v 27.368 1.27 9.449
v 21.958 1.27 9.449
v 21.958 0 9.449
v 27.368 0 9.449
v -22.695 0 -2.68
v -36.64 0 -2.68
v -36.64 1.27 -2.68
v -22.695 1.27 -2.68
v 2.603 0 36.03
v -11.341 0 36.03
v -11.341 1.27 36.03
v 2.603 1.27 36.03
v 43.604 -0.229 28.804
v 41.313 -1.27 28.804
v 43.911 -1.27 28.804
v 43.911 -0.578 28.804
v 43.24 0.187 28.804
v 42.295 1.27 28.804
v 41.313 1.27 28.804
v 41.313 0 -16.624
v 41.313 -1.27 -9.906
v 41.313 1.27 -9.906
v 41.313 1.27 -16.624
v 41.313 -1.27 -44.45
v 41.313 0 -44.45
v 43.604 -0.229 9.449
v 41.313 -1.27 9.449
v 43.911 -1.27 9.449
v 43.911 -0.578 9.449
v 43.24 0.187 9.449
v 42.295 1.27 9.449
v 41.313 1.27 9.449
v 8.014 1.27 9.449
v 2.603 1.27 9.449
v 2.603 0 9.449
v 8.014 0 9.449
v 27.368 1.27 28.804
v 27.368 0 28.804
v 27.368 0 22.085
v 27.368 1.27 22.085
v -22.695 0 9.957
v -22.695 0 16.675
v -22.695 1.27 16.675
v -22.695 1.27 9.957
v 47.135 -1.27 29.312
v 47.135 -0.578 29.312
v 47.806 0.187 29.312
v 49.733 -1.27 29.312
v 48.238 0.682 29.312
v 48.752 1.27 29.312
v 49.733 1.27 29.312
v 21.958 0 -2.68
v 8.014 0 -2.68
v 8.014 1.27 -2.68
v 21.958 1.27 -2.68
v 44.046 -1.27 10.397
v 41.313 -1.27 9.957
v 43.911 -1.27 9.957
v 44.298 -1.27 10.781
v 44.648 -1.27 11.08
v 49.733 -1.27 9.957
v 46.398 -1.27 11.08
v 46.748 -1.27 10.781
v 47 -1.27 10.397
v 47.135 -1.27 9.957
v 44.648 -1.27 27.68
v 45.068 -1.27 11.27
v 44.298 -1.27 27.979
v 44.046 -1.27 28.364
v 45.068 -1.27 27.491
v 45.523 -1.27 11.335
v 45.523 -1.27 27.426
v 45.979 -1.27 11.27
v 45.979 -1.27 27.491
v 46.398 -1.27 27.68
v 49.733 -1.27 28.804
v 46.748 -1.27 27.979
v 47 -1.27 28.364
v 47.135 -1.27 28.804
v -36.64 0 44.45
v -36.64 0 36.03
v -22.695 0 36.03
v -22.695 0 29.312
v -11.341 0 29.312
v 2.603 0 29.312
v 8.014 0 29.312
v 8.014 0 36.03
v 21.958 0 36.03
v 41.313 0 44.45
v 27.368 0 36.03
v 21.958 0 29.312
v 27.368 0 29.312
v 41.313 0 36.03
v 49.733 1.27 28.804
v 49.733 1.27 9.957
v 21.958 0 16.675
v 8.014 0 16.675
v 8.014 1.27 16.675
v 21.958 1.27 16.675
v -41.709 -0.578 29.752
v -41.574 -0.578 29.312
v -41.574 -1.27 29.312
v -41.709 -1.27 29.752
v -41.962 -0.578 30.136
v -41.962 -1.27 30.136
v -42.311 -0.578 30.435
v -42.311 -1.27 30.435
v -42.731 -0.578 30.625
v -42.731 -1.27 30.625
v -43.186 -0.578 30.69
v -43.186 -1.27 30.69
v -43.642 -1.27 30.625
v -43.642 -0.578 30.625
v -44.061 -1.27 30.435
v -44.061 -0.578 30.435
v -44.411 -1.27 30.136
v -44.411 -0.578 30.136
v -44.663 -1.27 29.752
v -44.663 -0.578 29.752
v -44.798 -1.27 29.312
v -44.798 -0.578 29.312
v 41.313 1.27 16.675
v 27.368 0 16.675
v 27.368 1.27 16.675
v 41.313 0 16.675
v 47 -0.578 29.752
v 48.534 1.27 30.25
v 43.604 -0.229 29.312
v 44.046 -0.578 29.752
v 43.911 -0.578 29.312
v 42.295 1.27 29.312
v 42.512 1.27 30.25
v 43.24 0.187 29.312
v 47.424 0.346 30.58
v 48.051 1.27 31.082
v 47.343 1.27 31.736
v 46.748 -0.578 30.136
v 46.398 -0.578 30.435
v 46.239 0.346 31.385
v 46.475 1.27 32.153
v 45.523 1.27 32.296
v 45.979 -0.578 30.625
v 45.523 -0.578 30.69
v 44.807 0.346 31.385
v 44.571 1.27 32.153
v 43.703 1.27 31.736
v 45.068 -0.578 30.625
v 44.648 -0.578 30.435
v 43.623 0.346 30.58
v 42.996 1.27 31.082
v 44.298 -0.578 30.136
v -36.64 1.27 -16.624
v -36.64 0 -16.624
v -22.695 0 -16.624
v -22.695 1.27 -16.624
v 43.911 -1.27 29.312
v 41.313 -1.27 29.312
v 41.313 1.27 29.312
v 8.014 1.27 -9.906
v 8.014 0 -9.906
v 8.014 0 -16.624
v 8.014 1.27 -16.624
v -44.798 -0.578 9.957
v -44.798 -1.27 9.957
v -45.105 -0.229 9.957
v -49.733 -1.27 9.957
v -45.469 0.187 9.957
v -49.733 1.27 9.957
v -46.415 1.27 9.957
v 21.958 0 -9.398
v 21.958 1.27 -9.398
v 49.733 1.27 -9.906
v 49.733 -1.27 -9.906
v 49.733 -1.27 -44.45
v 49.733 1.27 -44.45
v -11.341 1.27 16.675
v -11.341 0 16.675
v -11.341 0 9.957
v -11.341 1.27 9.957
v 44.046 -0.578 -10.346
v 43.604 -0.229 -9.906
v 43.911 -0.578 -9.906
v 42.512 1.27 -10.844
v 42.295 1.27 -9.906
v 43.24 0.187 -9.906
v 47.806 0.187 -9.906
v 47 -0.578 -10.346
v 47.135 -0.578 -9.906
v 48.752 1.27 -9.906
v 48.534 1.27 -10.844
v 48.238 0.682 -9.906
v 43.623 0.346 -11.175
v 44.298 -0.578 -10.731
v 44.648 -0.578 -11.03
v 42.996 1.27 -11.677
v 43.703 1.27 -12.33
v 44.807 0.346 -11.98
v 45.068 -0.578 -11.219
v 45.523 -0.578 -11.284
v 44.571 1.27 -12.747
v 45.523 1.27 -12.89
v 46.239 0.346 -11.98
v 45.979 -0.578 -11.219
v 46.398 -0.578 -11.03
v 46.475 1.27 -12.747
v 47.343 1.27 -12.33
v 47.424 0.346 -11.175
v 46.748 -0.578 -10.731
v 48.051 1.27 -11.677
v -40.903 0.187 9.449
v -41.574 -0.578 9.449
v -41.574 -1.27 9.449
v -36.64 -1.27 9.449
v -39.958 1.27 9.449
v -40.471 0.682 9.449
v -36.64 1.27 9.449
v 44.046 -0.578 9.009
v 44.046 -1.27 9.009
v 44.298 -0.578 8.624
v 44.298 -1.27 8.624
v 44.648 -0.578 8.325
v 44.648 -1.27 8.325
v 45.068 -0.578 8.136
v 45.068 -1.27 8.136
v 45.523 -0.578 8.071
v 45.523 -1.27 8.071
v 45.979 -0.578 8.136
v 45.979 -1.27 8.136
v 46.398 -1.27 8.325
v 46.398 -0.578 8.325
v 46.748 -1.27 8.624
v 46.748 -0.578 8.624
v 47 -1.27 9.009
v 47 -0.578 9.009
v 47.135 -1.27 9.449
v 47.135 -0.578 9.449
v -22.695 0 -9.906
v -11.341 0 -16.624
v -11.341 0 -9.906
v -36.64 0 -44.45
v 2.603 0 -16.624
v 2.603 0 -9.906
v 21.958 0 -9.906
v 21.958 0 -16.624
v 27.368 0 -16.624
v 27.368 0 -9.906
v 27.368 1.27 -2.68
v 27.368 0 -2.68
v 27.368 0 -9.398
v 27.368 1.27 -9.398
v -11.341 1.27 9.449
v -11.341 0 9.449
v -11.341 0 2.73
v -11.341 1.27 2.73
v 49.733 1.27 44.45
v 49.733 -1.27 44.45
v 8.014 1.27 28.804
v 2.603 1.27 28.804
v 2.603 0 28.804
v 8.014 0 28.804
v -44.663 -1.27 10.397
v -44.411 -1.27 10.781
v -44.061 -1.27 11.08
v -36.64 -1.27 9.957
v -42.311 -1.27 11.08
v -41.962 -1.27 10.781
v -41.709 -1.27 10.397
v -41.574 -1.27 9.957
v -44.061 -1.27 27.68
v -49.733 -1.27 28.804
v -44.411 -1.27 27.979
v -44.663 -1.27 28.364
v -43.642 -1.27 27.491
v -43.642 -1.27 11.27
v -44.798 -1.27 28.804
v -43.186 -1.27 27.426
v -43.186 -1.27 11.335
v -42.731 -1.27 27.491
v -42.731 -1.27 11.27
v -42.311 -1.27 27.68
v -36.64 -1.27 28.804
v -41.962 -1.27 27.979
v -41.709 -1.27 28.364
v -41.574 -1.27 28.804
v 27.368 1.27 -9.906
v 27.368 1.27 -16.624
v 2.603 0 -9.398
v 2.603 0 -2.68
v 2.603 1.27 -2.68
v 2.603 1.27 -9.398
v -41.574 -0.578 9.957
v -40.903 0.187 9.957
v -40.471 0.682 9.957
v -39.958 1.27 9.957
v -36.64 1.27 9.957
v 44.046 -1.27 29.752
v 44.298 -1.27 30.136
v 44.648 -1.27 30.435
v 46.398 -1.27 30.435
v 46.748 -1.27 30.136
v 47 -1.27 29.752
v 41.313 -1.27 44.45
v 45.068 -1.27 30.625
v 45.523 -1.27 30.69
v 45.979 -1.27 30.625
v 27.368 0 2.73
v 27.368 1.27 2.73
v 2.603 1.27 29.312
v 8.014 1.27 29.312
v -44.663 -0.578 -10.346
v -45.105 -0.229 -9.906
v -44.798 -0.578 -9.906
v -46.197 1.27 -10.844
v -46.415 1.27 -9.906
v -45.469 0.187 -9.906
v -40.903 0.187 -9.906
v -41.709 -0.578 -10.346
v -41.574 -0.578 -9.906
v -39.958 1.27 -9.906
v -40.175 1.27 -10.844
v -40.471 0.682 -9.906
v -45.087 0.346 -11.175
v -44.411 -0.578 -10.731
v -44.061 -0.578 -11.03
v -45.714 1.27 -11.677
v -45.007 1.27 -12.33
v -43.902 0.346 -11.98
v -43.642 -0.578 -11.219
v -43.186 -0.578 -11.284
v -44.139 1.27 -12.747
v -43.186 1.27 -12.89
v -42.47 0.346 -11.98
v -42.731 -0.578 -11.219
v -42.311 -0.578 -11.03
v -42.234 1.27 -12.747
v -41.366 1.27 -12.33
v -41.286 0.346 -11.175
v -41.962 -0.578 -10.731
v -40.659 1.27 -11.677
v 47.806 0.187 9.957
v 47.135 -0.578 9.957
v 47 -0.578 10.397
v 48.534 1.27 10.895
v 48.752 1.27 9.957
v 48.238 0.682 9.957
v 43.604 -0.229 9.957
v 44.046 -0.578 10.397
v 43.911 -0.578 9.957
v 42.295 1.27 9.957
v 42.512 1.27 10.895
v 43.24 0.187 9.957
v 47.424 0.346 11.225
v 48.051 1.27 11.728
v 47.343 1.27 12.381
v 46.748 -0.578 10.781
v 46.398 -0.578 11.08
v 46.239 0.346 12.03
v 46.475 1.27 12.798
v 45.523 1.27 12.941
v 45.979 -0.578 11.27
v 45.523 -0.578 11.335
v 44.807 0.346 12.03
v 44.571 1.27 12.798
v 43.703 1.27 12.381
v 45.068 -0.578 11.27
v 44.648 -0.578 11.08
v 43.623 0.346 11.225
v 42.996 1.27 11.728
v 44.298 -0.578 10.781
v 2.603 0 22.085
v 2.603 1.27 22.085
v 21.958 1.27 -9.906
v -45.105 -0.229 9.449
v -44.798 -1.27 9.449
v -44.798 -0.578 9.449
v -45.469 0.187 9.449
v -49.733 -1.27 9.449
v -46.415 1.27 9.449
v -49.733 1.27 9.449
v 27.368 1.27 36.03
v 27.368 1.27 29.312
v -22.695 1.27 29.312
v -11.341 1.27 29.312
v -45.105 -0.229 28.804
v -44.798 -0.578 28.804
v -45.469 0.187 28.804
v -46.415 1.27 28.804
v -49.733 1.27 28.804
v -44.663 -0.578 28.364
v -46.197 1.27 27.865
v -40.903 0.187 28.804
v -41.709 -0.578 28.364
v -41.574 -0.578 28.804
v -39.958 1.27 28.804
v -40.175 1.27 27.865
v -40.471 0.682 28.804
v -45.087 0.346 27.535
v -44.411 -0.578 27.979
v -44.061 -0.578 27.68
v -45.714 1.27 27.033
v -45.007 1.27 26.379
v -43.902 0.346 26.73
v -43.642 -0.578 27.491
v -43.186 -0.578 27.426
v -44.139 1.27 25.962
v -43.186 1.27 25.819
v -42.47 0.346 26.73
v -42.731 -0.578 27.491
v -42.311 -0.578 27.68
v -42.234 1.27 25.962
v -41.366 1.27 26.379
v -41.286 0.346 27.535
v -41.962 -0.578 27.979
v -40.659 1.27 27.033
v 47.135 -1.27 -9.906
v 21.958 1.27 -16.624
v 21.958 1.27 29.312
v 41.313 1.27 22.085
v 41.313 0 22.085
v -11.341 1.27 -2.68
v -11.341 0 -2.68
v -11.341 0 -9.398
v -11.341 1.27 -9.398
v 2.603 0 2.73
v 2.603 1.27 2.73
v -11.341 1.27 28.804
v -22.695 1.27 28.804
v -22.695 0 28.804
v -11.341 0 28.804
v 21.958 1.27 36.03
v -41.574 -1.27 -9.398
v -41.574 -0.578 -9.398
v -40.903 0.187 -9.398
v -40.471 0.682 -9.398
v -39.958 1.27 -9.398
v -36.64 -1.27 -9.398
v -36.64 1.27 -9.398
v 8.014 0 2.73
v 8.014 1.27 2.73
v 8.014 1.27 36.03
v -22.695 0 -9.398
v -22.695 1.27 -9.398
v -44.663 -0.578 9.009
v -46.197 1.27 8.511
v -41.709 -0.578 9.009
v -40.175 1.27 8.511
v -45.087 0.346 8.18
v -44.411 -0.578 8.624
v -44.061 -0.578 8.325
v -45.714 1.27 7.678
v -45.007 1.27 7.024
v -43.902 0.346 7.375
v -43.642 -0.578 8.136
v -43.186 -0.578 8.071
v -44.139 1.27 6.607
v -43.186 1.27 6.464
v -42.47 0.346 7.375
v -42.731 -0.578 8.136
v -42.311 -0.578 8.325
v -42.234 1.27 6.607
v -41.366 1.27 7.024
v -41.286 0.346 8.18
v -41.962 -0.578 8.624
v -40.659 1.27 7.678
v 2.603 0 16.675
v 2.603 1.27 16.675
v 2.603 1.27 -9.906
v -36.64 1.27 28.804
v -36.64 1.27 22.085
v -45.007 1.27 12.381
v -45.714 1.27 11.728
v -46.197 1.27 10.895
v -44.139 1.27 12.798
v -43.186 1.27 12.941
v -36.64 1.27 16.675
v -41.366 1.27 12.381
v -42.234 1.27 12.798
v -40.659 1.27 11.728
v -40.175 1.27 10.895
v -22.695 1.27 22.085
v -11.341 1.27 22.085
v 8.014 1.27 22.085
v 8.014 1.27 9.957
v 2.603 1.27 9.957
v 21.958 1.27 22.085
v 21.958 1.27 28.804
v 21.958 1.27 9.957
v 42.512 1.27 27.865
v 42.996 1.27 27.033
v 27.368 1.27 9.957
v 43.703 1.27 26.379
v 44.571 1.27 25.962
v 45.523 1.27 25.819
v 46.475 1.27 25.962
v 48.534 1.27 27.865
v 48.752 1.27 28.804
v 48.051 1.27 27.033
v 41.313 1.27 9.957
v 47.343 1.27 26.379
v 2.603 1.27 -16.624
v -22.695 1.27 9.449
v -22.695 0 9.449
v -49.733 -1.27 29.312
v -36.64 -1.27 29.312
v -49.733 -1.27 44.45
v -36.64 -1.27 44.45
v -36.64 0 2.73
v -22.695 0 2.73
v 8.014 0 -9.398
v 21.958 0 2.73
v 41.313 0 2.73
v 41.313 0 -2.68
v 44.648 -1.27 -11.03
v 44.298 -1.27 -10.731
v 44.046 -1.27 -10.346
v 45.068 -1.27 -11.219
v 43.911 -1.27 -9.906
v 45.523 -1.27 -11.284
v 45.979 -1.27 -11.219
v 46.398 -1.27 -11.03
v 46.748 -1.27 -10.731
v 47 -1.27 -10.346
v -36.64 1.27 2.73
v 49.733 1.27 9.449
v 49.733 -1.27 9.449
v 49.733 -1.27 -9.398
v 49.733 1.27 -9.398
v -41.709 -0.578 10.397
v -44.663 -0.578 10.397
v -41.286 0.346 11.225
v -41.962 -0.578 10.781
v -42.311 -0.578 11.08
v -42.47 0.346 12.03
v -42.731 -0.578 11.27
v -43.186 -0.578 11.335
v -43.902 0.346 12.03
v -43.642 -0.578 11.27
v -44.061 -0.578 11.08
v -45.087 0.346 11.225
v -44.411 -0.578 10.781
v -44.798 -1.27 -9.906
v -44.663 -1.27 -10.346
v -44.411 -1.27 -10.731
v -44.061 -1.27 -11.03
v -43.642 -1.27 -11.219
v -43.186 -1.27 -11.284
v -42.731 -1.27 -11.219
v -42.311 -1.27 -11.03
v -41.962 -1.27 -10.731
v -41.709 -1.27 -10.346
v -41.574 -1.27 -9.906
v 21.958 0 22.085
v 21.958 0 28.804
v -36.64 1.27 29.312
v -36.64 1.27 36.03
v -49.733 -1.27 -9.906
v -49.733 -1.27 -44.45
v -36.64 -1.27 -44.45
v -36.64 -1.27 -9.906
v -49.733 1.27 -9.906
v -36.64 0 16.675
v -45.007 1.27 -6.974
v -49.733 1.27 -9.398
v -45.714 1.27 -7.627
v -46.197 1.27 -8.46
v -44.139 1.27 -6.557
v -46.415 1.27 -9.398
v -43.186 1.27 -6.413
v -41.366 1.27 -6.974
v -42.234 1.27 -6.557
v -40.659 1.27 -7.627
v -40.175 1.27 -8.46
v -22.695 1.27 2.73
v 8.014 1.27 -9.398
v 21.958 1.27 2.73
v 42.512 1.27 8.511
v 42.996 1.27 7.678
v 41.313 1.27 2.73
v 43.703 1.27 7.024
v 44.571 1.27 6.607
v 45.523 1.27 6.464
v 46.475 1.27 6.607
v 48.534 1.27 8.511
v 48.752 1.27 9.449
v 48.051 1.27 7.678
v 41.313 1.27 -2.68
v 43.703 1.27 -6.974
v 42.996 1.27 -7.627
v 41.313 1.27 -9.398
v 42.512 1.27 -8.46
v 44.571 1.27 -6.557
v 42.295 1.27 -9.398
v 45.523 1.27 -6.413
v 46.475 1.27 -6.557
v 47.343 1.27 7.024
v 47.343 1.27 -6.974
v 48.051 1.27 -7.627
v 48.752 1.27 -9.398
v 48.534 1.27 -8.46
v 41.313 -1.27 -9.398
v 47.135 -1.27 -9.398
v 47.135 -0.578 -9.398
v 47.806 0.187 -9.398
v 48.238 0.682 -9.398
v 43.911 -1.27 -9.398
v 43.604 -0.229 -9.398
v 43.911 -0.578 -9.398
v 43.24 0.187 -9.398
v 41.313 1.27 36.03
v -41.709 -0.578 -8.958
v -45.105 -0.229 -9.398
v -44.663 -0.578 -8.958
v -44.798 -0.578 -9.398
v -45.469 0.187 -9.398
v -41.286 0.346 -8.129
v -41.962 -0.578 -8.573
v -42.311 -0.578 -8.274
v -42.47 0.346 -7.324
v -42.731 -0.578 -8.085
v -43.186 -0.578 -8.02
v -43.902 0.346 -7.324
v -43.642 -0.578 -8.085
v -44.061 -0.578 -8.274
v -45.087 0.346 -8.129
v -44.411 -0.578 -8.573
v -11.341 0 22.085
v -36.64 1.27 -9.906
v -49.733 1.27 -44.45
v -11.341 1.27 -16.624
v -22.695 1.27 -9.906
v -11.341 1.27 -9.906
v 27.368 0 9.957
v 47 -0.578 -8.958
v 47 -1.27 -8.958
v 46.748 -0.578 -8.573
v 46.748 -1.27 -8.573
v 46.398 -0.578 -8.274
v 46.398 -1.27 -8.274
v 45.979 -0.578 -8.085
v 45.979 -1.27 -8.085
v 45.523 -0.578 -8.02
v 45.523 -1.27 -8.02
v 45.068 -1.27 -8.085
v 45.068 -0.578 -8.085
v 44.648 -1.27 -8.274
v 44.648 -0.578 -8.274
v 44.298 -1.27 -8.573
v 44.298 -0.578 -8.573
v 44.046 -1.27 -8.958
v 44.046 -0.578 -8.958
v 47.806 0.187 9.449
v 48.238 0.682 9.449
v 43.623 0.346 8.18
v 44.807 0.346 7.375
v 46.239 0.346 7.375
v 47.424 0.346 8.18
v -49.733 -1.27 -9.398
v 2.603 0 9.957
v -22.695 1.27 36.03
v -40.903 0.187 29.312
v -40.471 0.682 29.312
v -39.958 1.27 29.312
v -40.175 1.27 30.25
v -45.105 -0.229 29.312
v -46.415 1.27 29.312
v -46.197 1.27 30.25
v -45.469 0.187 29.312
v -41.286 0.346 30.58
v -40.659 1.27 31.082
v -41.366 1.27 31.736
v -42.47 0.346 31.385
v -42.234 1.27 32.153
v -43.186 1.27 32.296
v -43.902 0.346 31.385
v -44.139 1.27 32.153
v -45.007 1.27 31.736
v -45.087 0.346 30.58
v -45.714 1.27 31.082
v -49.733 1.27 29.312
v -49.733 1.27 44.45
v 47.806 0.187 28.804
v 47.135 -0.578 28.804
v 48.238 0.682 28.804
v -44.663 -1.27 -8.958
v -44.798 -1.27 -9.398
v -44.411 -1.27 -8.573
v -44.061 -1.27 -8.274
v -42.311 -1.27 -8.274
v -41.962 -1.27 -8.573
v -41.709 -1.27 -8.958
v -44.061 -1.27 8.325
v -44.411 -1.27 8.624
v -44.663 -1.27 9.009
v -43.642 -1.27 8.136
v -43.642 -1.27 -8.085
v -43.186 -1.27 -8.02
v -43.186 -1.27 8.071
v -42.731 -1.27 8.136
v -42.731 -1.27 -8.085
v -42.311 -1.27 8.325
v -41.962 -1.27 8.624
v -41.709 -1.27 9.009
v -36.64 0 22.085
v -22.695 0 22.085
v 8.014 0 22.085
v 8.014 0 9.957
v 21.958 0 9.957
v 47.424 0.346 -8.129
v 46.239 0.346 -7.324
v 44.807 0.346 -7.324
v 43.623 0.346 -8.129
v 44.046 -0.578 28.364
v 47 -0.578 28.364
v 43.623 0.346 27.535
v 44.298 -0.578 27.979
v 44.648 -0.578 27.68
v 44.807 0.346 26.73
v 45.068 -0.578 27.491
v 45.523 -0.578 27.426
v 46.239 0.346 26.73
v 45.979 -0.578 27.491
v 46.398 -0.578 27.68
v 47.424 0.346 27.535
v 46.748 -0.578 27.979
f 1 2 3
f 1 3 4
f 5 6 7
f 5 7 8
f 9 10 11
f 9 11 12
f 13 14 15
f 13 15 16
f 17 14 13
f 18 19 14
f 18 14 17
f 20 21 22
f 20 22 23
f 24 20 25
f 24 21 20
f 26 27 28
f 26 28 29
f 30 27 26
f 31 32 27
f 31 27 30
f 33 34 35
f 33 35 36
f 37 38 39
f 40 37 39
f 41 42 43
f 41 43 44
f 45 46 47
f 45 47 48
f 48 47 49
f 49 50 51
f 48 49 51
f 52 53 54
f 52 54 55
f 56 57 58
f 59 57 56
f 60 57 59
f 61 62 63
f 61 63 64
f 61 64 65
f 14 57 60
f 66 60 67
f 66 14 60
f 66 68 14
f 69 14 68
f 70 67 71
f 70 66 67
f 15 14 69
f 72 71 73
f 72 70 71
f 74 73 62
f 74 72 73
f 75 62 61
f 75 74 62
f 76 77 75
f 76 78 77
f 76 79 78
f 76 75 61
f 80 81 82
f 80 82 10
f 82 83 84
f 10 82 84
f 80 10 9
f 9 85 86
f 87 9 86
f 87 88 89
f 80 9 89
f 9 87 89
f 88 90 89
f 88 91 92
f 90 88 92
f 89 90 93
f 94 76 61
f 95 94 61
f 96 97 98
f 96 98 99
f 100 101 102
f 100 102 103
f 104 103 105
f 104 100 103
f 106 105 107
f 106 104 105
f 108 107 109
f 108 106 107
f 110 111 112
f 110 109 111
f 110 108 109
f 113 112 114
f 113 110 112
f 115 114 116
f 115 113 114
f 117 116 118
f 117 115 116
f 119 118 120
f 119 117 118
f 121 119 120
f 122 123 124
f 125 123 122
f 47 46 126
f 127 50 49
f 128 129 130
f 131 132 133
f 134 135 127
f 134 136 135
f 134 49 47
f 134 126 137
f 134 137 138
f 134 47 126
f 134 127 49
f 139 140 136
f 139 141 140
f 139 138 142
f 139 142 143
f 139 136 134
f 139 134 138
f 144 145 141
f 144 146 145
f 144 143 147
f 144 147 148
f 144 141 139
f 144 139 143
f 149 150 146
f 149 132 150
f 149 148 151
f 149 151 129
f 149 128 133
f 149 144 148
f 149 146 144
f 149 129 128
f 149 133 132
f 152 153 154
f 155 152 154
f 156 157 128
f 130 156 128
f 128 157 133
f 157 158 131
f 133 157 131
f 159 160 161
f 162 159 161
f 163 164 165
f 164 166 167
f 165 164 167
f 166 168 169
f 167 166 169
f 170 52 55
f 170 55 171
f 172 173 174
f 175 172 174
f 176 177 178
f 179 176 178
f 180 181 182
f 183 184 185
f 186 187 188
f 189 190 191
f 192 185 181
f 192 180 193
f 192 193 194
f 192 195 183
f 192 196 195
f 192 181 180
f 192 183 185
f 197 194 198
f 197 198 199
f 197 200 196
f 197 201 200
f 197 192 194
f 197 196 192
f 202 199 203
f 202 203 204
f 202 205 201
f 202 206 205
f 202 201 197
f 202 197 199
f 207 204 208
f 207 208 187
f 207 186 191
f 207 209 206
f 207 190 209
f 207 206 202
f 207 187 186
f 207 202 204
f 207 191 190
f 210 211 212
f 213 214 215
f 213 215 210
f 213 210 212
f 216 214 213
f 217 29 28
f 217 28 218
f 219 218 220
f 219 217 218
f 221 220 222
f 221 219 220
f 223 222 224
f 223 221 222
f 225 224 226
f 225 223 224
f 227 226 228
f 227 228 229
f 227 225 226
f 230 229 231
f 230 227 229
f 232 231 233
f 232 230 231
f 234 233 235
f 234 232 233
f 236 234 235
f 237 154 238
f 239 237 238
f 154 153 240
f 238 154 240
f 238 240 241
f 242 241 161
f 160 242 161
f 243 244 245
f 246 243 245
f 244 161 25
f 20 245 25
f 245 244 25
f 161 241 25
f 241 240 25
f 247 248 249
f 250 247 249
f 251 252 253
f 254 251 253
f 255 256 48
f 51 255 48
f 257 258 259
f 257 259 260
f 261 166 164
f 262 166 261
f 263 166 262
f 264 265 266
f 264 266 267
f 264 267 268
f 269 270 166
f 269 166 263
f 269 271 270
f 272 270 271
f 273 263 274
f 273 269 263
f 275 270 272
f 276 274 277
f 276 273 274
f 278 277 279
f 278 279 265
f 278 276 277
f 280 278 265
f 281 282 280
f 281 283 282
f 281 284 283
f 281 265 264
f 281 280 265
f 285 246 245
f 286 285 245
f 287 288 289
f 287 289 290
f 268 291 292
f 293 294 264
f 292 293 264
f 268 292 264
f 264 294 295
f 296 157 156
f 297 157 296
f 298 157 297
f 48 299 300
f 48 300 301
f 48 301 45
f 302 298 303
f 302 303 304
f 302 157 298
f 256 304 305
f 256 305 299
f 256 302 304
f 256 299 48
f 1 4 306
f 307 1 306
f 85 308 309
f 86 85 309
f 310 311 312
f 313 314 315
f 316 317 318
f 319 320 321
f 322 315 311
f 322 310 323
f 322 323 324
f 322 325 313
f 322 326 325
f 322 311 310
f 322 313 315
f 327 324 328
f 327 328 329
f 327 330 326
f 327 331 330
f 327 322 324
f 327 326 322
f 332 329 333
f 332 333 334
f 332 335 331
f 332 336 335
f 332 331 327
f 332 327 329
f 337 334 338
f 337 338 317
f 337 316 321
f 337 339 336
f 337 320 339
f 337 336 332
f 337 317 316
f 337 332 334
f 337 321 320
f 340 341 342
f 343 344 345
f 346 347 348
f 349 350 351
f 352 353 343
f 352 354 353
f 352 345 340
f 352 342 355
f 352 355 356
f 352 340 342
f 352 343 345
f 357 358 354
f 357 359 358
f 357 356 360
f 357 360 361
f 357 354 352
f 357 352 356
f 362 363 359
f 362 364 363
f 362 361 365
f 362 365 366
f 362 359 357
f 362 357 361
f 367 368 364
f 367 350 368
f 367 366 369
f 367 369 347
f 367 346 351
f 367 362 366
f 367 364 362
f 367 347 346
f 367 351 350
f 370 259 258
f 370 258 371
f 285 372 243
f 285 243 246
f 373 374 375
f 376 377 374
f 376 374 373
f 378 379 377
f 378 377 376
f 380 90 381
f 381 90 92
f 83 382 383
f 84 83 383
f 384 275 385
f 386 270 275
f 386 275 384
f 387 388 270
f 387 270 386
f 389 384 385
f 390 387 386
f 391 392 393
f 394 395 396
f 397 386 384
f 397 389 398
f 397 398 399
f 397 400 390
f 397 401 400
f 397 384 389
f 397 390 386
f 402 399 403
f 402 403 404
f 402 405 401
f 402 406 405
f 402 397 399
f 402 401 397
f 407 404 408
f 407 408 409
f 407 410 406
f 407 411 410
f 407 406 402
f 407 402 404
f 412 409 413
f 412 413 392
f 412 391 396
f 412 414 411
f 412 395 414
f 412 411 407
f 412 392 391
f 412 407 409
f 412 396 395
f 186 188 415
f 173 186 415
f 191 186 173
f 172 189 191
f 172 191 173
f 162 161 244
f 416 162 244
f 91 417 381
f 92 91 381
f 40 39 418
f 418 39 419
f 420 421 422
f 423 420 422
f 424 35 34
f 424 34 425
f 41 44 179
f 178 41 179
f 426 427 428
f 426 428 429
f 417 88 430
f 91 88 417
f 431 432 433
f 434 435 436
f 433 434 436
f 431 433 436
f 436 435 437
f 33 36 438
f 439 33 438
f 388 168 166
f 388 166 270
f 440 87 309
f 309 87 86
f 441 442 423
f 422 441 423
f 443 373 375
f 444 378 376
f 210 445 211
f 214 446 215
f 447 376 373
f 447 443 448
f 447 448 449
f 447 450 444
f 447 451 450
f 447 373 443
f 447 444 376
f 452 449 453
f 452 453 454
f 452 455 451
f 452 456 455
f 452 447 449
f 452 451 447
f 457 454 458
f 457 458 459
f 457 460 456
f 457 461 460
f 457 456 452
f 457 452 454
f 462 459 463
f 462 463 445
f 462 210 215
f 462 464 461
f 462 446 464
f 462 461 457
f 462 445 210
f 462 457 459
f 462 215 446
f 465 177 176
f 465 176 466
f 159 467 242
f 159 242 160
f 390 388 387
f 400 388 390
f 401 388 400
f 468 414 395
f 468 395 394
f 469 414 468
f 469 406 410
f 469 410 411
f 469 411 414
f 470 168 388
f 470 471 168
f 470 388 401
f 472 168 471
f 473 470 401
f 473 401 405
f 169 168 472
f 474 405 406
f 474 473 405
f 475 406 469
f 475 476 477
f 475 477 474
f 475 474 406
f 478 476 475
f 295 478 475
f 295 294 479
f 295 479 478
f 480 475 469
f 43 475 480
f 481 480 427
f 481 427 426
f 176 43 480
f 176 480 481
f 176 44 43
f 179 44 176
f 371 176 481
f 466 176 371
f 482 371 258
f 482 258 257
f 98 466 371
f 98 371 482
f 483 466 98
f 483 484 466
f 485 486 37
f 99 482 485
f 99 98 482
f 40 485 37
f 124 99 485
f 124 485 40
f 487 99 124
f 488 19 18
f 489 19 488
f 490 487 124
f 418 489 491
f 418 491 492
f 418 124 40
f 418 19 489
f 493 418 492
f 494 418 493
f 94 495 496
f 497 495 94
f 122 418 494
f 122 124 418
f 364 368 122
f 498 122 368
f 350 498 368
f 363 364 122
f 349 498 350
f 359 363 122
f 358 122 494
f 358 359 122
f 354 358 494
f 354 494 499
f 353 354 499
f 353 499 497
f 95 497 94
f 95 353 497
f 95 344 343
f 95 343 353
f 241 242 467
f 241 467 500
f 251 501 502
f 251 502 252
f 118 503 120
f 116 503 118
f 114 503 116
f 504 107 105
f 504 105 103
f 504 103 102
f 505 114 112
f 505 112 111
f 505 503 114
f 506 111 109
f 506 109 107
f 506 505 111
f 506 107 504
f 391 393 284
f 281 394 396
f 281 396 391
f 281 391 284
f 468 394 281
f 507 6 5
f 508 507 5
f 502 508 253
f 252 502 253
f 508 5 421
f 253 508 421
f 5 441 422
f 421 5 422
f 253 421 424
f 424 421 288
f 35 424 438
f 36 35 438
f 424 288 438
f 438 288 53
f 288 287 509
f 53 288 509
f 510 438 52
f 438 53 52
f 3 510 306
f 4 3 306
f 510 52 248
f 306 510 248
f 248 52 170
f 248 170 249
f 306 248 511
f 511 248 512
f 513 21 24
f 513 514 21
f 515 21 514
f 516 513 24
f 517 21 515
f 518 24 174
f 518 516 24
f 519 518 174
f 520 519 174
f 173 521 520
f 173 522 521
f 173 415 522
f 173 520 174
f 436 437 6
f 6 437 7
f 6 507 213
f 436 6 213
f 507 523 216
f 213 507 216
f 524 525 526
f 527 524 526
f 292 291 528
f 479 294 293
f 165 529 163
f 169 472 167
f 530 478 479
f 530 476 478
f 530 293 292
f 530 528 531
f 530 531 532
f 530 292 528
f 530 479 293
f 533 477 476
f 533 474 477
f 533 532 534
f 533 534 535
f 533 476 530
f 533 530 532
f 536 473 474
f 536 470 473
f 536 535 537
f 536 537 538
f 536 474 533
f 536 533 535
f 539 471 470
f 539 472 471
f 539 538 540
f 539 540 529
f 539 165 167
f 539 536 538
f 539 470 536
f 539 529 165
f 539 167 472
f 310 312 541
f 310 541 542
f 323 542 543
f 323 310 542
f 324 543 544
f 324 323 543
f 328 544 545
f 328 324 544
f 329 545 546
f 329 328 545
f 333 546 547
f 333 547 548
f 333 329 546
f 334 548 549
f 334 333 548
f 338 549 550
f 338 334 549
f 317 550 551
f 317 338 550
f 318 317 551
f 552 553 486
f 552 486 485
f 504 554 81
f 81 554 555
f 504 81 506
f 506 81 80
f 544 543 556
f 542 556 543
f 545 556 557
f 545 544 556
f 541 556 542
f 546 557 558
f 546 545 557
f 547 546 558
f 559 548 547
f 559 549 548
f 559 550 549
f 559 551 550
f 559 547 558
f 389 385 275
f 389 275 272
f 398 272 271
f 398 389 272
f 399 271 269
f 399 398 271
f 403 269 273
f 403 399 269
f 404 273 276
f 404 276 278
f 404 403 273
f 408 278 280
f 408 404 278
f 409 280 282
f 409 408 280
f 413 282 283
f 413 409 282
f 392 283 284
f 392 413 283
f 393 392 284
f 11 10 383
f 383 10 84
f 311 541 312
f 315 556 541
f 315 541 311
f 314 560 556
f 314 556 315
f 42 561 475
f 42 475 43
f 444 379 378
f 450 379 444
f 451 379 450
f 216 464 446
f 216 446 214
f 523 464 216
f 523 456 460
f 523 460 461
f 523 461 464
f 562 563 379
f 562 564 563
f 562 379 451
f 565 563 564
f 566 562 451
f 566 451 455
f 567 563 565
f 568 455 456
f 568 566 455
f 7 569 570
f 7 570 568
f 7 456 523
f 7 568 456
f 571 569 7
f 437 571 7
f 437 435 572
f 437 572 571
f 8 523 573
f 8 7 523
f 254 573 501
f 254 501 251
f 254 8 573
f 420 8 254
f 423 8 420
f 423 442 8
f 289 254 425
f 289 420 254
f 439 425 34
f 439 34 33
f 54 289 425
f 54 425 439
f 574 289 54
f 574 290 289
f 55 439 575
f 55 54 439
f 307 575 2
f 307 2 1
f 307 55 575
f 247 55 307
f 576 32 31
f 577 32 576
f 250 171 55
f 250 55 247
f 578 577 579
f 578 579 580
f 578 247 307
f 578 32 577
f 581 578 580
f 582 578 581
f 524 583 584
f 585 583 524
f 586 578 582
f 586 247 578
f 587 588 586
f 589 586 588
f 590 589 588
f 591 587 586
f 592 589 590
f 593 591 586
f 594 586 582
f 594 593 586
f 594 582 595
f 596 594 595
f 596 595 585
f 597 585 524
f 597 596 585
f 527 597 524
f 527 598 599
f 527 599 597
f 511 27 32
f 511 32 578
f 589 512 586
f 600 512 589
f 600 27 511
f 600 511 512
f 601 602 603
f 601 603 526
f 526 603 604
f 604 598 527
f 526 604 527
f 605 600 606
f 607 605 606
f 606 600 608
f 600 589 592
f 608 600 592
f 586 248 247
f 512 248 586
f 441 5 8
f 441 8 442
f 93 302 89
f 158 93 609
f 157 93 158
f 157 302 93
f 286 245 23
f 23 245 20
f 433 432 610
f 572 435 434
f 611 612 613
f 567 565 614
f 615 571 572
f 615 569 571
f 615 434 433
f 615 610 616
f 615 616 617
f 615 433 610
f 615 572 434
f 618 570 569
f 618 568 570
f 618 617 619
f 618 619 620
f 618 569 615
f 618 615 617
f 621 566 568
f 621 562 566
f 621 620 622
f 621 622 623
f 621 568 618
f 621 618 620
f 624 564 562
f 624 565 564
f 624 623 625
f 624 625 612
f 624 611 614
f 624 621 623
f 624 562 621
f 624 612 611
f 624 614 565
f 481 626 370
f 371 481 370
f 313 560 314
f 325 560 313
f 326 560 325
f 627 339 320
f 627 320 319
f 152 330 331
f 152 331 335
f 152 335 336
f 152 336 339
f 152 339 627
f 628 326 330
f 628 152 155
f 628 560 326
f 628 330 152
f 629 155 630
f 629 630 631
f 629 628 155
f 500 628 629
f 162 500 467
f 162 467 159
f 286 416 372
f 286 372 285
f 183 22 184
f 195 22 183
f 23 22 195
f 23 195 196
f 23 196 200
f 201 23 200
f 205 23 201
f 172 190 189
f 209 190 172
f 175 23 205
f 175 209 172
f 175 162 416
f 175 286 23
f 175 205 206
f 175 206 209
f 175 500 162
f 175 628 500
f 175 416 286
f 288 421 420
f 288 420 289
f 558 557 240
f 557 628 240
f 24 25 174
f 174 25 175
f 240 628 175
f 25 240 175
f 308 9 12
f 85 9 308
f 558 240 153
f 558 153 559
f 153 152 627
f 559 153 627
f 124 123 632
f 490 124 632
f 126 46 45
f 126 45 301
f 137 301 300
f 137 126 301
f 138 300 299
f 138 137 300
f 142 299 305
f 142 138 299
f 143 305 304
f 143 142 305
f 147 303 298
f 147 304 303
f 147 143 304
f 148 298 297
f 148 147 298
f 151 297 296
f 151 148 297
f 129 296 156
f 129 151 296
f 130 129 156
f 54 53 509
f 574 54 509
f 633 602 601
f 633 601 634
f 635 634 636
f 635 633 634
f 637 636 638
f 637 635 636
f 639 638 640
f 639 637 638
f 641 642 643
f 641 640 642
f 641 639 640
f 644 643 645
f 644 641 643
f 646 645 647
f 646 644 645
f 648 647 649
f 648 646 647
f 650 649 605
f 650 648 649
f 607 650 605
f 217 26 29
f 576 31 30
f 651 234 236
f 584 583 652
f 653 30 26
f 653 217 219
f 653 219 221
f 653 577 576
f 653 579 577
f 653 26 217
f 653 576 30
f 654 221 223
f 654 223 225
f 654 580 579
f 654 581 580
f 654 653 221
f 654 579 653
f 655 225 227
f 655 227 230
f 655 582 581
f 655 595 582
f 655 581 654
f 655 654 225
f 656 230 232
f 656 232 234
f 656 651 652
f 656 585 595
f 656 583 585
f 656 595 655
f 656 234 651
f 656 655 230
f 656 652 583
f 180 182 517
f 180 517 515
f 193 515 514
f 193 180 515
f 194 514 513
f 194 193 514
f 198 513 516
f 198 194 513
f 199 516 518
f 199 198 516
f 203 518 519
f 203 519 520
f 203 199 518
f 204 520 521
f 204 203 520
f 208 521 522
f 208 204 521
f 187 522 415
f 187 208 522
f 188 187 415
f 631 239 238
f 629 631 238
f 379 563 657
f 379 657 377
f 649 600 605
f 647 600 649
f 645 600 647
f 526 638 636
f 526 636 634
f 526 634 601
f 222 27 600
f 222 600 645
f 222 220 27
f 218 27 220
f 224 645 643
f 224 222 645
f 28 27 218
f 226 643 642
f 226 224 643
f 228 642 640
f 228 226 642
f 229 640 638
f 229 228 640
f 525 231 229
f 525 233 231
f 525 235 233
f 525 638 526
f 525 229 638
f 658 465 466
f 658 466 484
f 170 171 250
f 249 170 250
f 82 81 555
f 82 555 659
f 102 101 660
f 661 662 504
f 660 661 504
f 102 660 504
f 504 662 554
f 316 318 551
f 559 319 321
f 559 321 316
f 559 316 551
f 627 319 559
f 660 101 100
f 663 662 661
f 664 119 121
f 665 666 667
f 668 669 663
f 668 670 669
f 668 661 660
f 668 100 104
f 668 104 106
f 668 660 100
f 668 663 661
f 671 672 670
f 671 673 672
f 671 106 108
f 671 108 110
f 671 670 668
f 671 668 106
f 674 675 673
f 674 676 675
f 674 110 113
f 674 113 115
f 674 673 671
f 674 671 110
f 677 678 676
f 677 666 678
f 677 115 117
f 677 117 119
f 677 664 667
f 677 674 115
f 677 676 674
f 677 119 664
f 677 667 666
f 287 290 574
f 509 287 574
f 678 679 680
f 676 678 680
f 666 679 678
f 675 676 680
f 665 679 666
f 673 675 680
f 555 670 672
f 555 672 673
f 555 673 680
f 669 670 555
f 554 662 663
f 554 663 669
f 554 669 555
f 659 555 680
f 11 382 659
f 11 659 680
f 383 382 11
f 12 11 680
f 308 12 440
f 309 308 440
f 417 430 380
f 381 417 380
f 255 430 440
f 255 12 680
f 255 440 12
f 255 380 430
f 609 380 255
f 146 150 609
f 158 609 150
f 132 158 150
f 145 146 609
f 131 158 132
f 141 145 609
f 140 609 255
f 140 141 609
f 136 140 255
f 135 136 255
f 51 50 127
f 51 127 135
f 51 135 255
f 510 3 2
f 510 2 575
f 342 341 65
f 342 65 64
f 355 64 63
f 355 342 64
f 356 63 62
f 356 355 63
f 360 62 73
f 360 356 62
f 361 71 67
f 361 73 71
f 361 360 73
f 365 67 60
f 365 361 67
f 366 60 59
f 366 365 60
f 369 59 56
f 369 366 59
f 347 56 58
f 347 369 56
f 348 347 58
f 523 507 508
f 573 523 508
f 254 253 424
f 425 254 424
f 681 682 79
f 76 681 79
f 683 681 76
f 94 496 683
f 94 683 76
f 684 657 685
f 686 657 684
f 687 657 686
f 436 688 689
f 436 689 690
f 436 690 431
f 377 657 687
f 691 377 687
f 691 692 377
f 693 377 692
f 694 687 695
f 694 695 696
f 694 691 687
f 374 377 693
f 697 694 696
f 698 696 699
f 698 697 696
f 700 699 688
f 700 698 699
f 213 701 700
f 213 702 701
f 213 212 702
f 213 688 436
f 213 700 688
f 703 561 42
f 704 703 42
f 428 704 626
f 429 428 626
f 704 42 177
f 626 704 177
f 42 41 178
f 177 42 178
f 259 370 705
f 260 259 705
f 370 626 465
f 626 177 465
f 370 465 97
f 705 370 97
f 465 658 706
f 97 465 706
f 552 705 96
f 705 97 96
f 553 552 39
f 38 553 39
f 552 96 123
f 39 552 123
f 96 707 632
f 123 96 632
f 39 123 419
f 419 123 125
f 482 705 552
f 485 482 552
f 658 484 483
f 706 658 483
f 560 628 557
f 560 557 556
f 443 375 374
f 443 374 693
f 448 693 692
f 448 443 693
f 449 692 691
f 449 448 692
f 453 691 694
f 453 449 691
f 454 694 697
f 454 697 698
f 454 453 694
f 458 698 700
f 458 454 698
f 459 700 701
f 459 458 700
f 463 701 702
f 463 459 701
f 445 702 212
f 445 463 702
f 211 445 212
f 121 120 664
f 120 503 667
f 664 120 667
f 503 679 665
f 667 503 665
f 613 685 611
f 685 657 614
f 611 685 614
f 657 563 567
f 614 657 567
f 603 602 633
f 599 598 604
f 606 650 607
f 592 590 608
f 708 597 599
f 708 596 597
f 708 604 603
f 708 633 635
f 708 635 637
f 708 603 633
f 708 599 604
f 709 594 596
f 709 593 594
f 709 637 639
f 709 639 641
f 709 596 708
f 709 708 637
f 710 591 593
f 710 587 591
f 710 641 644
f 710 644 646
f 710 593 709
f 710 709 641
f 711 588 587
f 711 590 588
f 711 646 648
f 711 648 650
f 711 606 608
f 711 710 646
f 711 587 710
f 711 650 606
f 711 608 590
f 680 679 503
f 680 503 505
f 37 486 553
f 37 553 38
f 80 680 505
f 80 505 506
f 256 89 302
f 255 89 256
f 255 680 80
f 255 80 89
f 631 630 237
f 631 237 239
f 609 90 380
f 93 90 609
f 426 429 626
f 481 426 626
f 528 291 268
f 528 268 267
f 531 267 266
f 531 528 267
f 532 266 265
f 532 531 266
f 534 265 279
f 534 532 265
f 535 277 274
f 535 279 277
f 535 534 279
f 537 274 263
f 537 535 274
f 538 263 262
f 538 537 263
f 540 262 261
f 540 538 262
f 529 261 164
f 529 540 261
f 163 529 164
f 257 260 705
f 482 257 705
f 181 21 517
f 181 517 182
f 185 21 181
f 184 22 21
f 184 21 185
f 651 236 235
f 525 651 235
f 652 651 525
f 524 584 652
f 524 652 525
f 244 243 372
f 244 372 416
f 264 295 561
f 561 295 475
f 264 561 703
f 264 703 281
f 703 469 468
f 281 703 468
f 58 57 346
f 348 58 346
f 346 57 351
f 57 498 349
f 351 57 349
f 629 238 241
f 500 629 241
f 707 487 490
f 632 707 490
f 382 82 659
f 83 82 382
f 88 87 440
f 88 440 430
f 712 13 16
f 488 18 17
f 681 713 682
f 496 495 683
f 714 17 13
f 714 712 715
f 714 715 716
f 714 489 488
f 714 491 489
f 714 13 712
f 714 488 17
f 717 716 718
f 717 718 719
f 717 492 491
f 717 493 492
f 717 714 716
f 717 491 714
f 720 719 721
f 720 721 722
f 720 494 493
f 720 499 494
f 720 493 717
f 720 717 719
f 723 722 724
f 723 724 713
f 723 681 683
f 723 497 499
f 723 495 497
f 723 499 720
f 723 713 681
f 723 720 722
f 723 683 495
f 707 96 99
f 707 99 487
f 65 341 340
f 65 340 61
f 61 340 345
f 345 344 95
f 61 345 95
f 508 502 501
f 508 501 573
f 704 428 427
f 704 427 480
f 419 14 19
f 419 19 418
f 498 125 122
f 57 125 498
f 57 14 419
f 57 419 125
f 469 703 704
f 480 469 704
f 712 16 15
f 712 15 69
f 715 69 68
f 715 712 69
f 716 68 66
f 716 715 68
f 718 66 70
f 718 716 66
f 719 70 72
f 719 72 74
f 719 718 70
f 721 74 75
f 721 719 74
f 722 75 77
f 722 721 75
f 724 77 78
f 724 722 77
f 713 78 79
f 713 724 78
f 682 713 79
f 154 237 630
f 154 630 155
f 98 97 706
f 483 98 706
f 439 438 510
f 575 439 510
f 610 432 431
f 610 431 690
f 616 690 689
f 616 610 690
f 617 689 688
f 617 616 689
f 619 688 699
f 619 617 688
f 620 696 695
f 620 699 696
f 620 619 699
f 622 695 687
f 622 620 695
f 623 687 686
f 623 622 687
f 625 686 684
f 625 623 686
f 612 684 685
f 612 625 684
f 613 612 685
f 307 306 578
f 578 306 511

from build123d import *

# Parameters (mm, degrees)
SKETCH1_W                                     = 99.4664
SKETCH1_H                                     = 88.9
SKETCH1_W_2                                   = 13.9446
SKETCH1_H_2                                   = 13.9446
BOSS_EXTRUDE1_DEPTH                           = 1.27
SKETCH6_W                                     = 13.0937
SKETCH6_H                                     = 88.9
SKETCH6_W_2                                   = 8.4201
BOSS_EXTRUDE2_DEPTH                           = 1.27
SKETCH2_W                                     = 99.4664
SKETCH2_H                                     = 0.508
CUT_EXTRUDE_THIN2_DEPTH                       = 67.750620089
CSK_FOR_4_FLAT_HEAD_SOCKET_CAP_SCREW1_A_COUNT = 2
CSK_FOR_4_FLAT_HEAD_SOCKET_CAP_SCREW1_A_PITCH = 19.3548
CSK_FOR_4_FLAT_HEAD_SOCKET_CAP_SCRE_2_COUNT   = 2
CSK_FOR_4_FLAT_HEAD_SOCKET_CAP_SCRE_2_PITCH   = 38.7096
CSK_FOR_4_FLAT_HEAD_SOCKET_CAP_SCRE_3_COUNT   = 2
CSK_FOR_4_FLAT_HEAD_SOCKET_CAP_SCRE_3_PITCH   = 88.7095
CSK_FOR_4_FLAT_HEAD_SOCKET_CAP_SCRE_4_COUNT   = 2
CSK_FOR_4_FLAT_HEAD_SOCKET_CAP_SCRE_4_PITCH   = 90.796385794
CSK_FOR_4_FLAT_HEAD_SOCKET_CAP_SCRE_5_COUNT   = 2
CSK_FOR_4_FLAT_HEAD_SOCKET_CAP_SCRE_5_PITCH   = 96.7874399


with BuildPart() as part:
    # Sketch1 → Boss-Extrude1 (new body)
    with BuildSketch(Plane(origin=(0, 0, 0), x_dir=(1, 0, 0), z_dir=(0, 1, 0))):
        Rectangle(SKETCH1_W, SKETCH1_H)
        with Locations((-4.3688, 9.652)):
            Rectangle(SKETCH1_W_2, SKETCH1_H_2, mode=Mode.SUBTRACT)
        with Locations((14.986, 9.652)):
            Rectangle(SKETCH1_W_2, SKETCH1_H_2, mode=Mode.SUBTRACT)
        with Locations((34.3408, 9.652)):
            Rectangle(SKETCH1_W_2, SKETCH1_H_2, mode=Mode.SUBTRACT)
        with Locations((-4.3688, -9.7028)):
            Rectangle(SKETCH1_W_2, SKETCH1_H_2, mode=Mode.SUBTRACT)
        with Locations((14.986, -9.7028)):
            Rectangle(SKETCH1_W_2, SKETCH1_H_2, mode=Mode.SUBTRACT)
        with Locations((34.3408, -9.7028)):
            Rectangle(SKETCH1_W_2, SKETCH1_H_2, mode=Mode.SUBTRACT)
        with Locations((-4.3688, -29.0576)):
            Rectangle(SKETCH1_W_2, SKETCH1_H_2, mode=Mode.SUBTRACT)
        with Locations((14.986, -29.0576)):
            Rectangle(SKETCH1_W_2, SKETCH1_H_2, mode=Mode.SUBTRACT)
        with Locations((34.3408, -29.0576)):
            Rectangle(SKETCH1_W_2, SKETCH1_H_2, mode=Mode.SUBTRACT)
        with Locations((-29.6672, 9.652)):
            Rectangle(SKETCH1_W_2, SKETCH1_H_2, mode=Mode.SUBTRACT)
        with Locations((-29.6672, -9.7028)):
            Rectangle(SKETCH1_W_2, SKETCH1_H_2, mode=Mode.SUBTRACT)
        with Locations((-29.6672, -29.0576)):
            Rectangle(SKETCH1_W_2, SKETCH1_H_2, mode=Mode.SUBTRACT)
    extrude(amount=BOSS_EXTRUDE1_DEPTH)

    # Sketch6 → Boss-Extrude2 (add)
    with BuildSketch(Plane.XZ):
        with Locations((-43.18635, 0)):
            Rectangle(SKETCH6_W, SKETCH6_H)
        with Locations((45.52315, 0)):
            Rectangle(SKETCH6_W_2, SKETCH6_H)
    extrude(amount=BOSS_EXTRUDE2_DEPTH)

    # Sketch2 → Cut-Extrude-Thin2 (cut, through all)
    with BuildSketch(Plane(origin=(0, 1.27, 0), x_dir=(1, 0, 0), z_dir=(0, 1, 0))):
        with Locations((0, 9.652)):
            Rectangle(SKETCH2_W, SKETCH2_H)
        with Locations((0, -9.7028)):
            Rectangle(SKETCH2_W, SKETCH2_H)
        with Locations((0, -29.0576)):
            Rectangle(SKETCH2_W, SKETCH2_H)
    extrude(amount=-CUT_EXTRUDE_THIN2_DEPTH, mode=Mode.SUBTRACT)


with BuildPart() as cut_extrude_thin2_piece_1:
    # of the separate pieces the step leaves, piece 1, a body of its own (cut_extrude_thin2_pieces)
    add(part.part.solids().sort_by_distance((-49.7332, 1.27, -44.45))[0])


with BuildPart() as cut_extrude_thin2_piece_2:
    # of the separate pieces the step leaves, piece 2, a body of its own (cut_extrude_thin2_pieces)
    add(part.part.solids().sort_by_distance((-49.7332, 1.27, -9.398))[0])


with BuildPart() as cut_extrude_thin2_piece_3:
    # of the separate pieces the step leaves, piece 3, a body of its own (cut_extrude_thin2_pieces)
    add(part.part.solids().sort_by_distance((-49.7332, 1.27, 9.9568))[0])


with BuildPart() as cut_extrude_thin2_piece_4:
    # of the separate pieces the step leaves, piece 4, a body of its own (cut_extrude_thin2_pieces)
    add(part.part.solids().sort_by_distance((-49.7332, 1.27, 44.45))[0])


with BuildPart() as csk_for_4_flat_head_socket_cap_screw1_tool:
    # Sketch7 → CSK for #4 Flat Head Socket Cap Screw1 (revolve)
    with BuildSketch(Plane(origin=(-43.18635, 1.27, -9.652), x_dir=(0, 0, 1), z_dir=(1, 0, 0))):
        Polygon((0, 0), (0, 2.54), (1.63195, 2.54), (1.63195, 1.848124365), (3.2385, 0), align=None)
    csk_for_4_flat_head_socket_cap_screw1 = revolve(axis=Axis((-43.18635, 7.62, -9.652), (0, -1, 0)))


with BuildPart() as cut_extrude_thin2_piece_1_1:
    add(cut_extrude_thin2_piece_1.part)

    # CSK for #4 Flat Head Socket Cap Screw1: cut by csk_for_4_flat_head_socket_cap_screw1_tool
    add(csk_for_4_flat_head_socket_cap_screw1_tool.part, mode=Mode.SUBTRACT)


with BuildPart() as cut_extrude_thin2_piece_2_1:
    add(cut_extrude_thin2_piece_2.part)

    # CSK for #4 Flat Head Socket Cap Screw1: cut by csk_for_4_flat_head_socket_cap_screw1_tool
    add(csk_for_4_flat_head_socket_cap_screw1_tool.part, mode=Mode.SUBTRACT)


with BuildPart() as csk_for_4_flat_head_socket_cap_screw1_a_tool:
    # CSK for #4 Flat Head Socket Cap Screw1 a: CSK for #4 Flat Head Socket Cap Screw1 ×2
    with Locations(*[(0, 0, i * CSK_FOR_4_FLAT_HEAD_SOCKET_CAP_SCREW1_A_PITCH) for i in range(1, CSK_FOR_4_FLAT_HEAD_SOCKET_CAP_SCREW1_A_COUNT)]):
        add(csk_for_4_flat_head_socket_cap_screw1)


with BuildPart() as cut_extrude_thin2_piece_2_2:
    add(cut_extrude_thin2_piece_2_1.part)

    # CSK for #4 Flat Head Socket Cap Screw1 a: cut by csk_for_4_flat_head_socket_cap_screw1_a_tool
    add(csk_for_4_flat_head_socket_cap_screw1_a_tool.part, mode=Mode.SUBTRACT)


with BuildPart() as cut_extrude_thin2_piece_3_1:
    add(cut_extrude_thin2_piece_3.part)

    # CSK for #4 Flat Head Socket Cap Screw1 a: cut by csk_for_4_flat_head_socket_cap_screw1_a_tool
    add(csk_for_4_flat_head_socket_cap_screw1_a_tool.part, mode=Mode.SUBTRACT)


with BuildPart() as csk_for_4_flat_head_socket_cap_scre_2_tool:
    # CSK for _4 Flat Head Socket Cap Scre 2: CSK for #4 Flat Head Socket Cap Screw1 ×2
    with Locations(*[(0, 0, i * CSK_FOR_4_FLAT_HEAD_SOCKET_CAP_SCRE_2_PITCH) for i in range(1, CSK_FOR_4_FLAT_HEAD_SOCKET_CAP_SCRE_2_COUNT)]):
        add(csk_for_4_flat_head_socket_cap_screw1)


with BuildPart() as cut_extrude_thin2_piece_3_2:
    add(cut_extrude_thin2_piece_3_1.part)

    # CSK for _4 Flat Head Socket Cap Scre 2: cut by csk_for_4_flat_head_socket_cap_scre_2_tool
    add(csk_for_4_flat_head_socket_cap_scre_2_tool.part, mode=Mode.SUBTRACT)


with BuildPart() as cut_extrude_thin2_piece_4_1:
    add(cut_extrude_thin2_piece_4.part)

    # CSK for _4 Flat Head Socket Cap Scre 2: cut by csk_for_4_flat_head_socket_cap_scre_2_tool
    add(csk_for_4_flat_head_socket_cap_scre_2_tool.part, mode=Mode.SUBTRACT)


with BuildPart() as csk_for_4_flat_head_socket_cap_scre_3_tool:
    # CSK for _4 Flat Head Socket Cap Scre 3: CSK for #4 Flat Head Socket Cap Screw1 ×2
    with Locations(*[(i * CSK_FOR_4_FLAT_HEAD_SOCKET_CAP_SCRE_3_PITCH, 0, 0) for i in range(1, CSK_FOR_4_FLAT_HEAD_SOCKET_CAP_SCRE_3_COUNT)]):
        add(csk_for_4_flat_head_socket_cap_screw1)


with BuildPart() as cut_extrude_thin2_piece_1_2:
    add(cut_extrude_thin2_piece_1_1.part)

    # CSK for _4 Flat Head Socket Cap Scre 3: cut by csk_for_4_flat_head_socket_cap_scre_3_tool
    add(csk_for_4_flat_head_socket_cap_scre_3_tool.part, mode=Mode.SUBTRACT)


with BuildPart() as cut_extrude_thin2_piece_2_3:
    add(cut_extrude_thin2_piece_2_2.part)

    # CSK for _4 Flat Head Socket Cap Scre 3: cut by csk_for_4_flat_head_socket_cap_scre_3_tool
    add(csk_for_4_flat_head_socket_cap_scre_3_tool.part, mode=Mode.SUBTRACT)


with BuildPart() as csk_for_4_flat_head_socket_cap_scre_4_tool:
    # CSK for _4 Flat Head Socket Cap Scre 4: CSK for #4 Flat Head Socket Cap Screw1 ×2
    with Locations(*[Vector(0.9770157614099922, 0, 0.21316707521672607) * (i * CSK_FOR_4_FLAT_HEAD_SOCKET_CAP_SCRE_4_PITCH) for i in range(1, CSK_FOR_4_FLAT_HEAD_SOCKET_CAP_SCRE_4_COUNT)]):
        add(csk_for_4_flat_head_socket_cap_screw1)


with BuildPart() as cut_extrude_thin2_piece_2_4:
    add(cut_extrude_thin2_piece_2_3.part)

    # CSK for _4 Flat Head Socket Cap Scre 4: cut by csk_for_4_flat_head_socket_cap_scre_4_tool
    add(csk_for_4_flat_head_socket_cap_scre_4_tool.part, mode=Mode.SUBTRACT)


with BuildPart() as cut_extrude_thin2_piece_3_3:
    add(cut_extrude_thin2_piece_3_2.part)

    # CSK for _4 Flat Head Socket Cap Scre 4: cut by csk_for_4_flat_head_socket_cap_scre_4_tool
    add(csk_for_4_flat_head_socket_cap_scre_4_tool.part, mode=Mode.SUBTRACT)


with BuildPart() as csk_for_4_flat_head_socket_cap_scre_5_tool:
    # CSK for _4 Flat Head Socket Cap Scre 5: CSK for #4 Flat Head Socket Cap Screw1 ×2
    with Locations(*[Vector(0.9165393783696331, 0, 0.39994445601584067) * (i * CSK_FOR_4_FLAT_HEAD_SOCKET_CAP_SCRE_5_PITCH) for i in range(1, CSK_FOR_4_FLAT_HEAD_SOCKET_CAP_SCRE_5_COUNT)]):
        add(csk_for_4_flat_head_socket_cap_screw1)


with BuildPart() as cut_extrude_thin2_piece_3_4:
    add(cut_extrude_thin2_piece_3_3.part)

    # CSK for _4 Flat Head Socket Cap Scre 5: cut by csk_for_4_flat_head_socket_cap_scre_5_tool
    add(csk_for_4_flat_head_socket_cap_scre_5_tool.part, mode=Mode.SUBTRACT)


with BuildPart() as cut_extrude_thin2_piece_4_2:
    add(cut_extrude_thin2_piece_4_1.part)

    # CSK for _4 Flat Head Socket Cap Scre 5: cut by csk_for_4_flat_head_socket_cap_scre_5_tool
    add(csk_for_4_flat_head_socket_cap_scre_5_tool.part, mode=Mode.SUBTRACT)


solid = Compound([cut_extrude_thin2_piece_1_2.part, cut_extrude_thin2_piece_2_4.part, cut_extrude_thin2_piece_3_4.part, cut_extrude_thin2_piece_4_2.part])
